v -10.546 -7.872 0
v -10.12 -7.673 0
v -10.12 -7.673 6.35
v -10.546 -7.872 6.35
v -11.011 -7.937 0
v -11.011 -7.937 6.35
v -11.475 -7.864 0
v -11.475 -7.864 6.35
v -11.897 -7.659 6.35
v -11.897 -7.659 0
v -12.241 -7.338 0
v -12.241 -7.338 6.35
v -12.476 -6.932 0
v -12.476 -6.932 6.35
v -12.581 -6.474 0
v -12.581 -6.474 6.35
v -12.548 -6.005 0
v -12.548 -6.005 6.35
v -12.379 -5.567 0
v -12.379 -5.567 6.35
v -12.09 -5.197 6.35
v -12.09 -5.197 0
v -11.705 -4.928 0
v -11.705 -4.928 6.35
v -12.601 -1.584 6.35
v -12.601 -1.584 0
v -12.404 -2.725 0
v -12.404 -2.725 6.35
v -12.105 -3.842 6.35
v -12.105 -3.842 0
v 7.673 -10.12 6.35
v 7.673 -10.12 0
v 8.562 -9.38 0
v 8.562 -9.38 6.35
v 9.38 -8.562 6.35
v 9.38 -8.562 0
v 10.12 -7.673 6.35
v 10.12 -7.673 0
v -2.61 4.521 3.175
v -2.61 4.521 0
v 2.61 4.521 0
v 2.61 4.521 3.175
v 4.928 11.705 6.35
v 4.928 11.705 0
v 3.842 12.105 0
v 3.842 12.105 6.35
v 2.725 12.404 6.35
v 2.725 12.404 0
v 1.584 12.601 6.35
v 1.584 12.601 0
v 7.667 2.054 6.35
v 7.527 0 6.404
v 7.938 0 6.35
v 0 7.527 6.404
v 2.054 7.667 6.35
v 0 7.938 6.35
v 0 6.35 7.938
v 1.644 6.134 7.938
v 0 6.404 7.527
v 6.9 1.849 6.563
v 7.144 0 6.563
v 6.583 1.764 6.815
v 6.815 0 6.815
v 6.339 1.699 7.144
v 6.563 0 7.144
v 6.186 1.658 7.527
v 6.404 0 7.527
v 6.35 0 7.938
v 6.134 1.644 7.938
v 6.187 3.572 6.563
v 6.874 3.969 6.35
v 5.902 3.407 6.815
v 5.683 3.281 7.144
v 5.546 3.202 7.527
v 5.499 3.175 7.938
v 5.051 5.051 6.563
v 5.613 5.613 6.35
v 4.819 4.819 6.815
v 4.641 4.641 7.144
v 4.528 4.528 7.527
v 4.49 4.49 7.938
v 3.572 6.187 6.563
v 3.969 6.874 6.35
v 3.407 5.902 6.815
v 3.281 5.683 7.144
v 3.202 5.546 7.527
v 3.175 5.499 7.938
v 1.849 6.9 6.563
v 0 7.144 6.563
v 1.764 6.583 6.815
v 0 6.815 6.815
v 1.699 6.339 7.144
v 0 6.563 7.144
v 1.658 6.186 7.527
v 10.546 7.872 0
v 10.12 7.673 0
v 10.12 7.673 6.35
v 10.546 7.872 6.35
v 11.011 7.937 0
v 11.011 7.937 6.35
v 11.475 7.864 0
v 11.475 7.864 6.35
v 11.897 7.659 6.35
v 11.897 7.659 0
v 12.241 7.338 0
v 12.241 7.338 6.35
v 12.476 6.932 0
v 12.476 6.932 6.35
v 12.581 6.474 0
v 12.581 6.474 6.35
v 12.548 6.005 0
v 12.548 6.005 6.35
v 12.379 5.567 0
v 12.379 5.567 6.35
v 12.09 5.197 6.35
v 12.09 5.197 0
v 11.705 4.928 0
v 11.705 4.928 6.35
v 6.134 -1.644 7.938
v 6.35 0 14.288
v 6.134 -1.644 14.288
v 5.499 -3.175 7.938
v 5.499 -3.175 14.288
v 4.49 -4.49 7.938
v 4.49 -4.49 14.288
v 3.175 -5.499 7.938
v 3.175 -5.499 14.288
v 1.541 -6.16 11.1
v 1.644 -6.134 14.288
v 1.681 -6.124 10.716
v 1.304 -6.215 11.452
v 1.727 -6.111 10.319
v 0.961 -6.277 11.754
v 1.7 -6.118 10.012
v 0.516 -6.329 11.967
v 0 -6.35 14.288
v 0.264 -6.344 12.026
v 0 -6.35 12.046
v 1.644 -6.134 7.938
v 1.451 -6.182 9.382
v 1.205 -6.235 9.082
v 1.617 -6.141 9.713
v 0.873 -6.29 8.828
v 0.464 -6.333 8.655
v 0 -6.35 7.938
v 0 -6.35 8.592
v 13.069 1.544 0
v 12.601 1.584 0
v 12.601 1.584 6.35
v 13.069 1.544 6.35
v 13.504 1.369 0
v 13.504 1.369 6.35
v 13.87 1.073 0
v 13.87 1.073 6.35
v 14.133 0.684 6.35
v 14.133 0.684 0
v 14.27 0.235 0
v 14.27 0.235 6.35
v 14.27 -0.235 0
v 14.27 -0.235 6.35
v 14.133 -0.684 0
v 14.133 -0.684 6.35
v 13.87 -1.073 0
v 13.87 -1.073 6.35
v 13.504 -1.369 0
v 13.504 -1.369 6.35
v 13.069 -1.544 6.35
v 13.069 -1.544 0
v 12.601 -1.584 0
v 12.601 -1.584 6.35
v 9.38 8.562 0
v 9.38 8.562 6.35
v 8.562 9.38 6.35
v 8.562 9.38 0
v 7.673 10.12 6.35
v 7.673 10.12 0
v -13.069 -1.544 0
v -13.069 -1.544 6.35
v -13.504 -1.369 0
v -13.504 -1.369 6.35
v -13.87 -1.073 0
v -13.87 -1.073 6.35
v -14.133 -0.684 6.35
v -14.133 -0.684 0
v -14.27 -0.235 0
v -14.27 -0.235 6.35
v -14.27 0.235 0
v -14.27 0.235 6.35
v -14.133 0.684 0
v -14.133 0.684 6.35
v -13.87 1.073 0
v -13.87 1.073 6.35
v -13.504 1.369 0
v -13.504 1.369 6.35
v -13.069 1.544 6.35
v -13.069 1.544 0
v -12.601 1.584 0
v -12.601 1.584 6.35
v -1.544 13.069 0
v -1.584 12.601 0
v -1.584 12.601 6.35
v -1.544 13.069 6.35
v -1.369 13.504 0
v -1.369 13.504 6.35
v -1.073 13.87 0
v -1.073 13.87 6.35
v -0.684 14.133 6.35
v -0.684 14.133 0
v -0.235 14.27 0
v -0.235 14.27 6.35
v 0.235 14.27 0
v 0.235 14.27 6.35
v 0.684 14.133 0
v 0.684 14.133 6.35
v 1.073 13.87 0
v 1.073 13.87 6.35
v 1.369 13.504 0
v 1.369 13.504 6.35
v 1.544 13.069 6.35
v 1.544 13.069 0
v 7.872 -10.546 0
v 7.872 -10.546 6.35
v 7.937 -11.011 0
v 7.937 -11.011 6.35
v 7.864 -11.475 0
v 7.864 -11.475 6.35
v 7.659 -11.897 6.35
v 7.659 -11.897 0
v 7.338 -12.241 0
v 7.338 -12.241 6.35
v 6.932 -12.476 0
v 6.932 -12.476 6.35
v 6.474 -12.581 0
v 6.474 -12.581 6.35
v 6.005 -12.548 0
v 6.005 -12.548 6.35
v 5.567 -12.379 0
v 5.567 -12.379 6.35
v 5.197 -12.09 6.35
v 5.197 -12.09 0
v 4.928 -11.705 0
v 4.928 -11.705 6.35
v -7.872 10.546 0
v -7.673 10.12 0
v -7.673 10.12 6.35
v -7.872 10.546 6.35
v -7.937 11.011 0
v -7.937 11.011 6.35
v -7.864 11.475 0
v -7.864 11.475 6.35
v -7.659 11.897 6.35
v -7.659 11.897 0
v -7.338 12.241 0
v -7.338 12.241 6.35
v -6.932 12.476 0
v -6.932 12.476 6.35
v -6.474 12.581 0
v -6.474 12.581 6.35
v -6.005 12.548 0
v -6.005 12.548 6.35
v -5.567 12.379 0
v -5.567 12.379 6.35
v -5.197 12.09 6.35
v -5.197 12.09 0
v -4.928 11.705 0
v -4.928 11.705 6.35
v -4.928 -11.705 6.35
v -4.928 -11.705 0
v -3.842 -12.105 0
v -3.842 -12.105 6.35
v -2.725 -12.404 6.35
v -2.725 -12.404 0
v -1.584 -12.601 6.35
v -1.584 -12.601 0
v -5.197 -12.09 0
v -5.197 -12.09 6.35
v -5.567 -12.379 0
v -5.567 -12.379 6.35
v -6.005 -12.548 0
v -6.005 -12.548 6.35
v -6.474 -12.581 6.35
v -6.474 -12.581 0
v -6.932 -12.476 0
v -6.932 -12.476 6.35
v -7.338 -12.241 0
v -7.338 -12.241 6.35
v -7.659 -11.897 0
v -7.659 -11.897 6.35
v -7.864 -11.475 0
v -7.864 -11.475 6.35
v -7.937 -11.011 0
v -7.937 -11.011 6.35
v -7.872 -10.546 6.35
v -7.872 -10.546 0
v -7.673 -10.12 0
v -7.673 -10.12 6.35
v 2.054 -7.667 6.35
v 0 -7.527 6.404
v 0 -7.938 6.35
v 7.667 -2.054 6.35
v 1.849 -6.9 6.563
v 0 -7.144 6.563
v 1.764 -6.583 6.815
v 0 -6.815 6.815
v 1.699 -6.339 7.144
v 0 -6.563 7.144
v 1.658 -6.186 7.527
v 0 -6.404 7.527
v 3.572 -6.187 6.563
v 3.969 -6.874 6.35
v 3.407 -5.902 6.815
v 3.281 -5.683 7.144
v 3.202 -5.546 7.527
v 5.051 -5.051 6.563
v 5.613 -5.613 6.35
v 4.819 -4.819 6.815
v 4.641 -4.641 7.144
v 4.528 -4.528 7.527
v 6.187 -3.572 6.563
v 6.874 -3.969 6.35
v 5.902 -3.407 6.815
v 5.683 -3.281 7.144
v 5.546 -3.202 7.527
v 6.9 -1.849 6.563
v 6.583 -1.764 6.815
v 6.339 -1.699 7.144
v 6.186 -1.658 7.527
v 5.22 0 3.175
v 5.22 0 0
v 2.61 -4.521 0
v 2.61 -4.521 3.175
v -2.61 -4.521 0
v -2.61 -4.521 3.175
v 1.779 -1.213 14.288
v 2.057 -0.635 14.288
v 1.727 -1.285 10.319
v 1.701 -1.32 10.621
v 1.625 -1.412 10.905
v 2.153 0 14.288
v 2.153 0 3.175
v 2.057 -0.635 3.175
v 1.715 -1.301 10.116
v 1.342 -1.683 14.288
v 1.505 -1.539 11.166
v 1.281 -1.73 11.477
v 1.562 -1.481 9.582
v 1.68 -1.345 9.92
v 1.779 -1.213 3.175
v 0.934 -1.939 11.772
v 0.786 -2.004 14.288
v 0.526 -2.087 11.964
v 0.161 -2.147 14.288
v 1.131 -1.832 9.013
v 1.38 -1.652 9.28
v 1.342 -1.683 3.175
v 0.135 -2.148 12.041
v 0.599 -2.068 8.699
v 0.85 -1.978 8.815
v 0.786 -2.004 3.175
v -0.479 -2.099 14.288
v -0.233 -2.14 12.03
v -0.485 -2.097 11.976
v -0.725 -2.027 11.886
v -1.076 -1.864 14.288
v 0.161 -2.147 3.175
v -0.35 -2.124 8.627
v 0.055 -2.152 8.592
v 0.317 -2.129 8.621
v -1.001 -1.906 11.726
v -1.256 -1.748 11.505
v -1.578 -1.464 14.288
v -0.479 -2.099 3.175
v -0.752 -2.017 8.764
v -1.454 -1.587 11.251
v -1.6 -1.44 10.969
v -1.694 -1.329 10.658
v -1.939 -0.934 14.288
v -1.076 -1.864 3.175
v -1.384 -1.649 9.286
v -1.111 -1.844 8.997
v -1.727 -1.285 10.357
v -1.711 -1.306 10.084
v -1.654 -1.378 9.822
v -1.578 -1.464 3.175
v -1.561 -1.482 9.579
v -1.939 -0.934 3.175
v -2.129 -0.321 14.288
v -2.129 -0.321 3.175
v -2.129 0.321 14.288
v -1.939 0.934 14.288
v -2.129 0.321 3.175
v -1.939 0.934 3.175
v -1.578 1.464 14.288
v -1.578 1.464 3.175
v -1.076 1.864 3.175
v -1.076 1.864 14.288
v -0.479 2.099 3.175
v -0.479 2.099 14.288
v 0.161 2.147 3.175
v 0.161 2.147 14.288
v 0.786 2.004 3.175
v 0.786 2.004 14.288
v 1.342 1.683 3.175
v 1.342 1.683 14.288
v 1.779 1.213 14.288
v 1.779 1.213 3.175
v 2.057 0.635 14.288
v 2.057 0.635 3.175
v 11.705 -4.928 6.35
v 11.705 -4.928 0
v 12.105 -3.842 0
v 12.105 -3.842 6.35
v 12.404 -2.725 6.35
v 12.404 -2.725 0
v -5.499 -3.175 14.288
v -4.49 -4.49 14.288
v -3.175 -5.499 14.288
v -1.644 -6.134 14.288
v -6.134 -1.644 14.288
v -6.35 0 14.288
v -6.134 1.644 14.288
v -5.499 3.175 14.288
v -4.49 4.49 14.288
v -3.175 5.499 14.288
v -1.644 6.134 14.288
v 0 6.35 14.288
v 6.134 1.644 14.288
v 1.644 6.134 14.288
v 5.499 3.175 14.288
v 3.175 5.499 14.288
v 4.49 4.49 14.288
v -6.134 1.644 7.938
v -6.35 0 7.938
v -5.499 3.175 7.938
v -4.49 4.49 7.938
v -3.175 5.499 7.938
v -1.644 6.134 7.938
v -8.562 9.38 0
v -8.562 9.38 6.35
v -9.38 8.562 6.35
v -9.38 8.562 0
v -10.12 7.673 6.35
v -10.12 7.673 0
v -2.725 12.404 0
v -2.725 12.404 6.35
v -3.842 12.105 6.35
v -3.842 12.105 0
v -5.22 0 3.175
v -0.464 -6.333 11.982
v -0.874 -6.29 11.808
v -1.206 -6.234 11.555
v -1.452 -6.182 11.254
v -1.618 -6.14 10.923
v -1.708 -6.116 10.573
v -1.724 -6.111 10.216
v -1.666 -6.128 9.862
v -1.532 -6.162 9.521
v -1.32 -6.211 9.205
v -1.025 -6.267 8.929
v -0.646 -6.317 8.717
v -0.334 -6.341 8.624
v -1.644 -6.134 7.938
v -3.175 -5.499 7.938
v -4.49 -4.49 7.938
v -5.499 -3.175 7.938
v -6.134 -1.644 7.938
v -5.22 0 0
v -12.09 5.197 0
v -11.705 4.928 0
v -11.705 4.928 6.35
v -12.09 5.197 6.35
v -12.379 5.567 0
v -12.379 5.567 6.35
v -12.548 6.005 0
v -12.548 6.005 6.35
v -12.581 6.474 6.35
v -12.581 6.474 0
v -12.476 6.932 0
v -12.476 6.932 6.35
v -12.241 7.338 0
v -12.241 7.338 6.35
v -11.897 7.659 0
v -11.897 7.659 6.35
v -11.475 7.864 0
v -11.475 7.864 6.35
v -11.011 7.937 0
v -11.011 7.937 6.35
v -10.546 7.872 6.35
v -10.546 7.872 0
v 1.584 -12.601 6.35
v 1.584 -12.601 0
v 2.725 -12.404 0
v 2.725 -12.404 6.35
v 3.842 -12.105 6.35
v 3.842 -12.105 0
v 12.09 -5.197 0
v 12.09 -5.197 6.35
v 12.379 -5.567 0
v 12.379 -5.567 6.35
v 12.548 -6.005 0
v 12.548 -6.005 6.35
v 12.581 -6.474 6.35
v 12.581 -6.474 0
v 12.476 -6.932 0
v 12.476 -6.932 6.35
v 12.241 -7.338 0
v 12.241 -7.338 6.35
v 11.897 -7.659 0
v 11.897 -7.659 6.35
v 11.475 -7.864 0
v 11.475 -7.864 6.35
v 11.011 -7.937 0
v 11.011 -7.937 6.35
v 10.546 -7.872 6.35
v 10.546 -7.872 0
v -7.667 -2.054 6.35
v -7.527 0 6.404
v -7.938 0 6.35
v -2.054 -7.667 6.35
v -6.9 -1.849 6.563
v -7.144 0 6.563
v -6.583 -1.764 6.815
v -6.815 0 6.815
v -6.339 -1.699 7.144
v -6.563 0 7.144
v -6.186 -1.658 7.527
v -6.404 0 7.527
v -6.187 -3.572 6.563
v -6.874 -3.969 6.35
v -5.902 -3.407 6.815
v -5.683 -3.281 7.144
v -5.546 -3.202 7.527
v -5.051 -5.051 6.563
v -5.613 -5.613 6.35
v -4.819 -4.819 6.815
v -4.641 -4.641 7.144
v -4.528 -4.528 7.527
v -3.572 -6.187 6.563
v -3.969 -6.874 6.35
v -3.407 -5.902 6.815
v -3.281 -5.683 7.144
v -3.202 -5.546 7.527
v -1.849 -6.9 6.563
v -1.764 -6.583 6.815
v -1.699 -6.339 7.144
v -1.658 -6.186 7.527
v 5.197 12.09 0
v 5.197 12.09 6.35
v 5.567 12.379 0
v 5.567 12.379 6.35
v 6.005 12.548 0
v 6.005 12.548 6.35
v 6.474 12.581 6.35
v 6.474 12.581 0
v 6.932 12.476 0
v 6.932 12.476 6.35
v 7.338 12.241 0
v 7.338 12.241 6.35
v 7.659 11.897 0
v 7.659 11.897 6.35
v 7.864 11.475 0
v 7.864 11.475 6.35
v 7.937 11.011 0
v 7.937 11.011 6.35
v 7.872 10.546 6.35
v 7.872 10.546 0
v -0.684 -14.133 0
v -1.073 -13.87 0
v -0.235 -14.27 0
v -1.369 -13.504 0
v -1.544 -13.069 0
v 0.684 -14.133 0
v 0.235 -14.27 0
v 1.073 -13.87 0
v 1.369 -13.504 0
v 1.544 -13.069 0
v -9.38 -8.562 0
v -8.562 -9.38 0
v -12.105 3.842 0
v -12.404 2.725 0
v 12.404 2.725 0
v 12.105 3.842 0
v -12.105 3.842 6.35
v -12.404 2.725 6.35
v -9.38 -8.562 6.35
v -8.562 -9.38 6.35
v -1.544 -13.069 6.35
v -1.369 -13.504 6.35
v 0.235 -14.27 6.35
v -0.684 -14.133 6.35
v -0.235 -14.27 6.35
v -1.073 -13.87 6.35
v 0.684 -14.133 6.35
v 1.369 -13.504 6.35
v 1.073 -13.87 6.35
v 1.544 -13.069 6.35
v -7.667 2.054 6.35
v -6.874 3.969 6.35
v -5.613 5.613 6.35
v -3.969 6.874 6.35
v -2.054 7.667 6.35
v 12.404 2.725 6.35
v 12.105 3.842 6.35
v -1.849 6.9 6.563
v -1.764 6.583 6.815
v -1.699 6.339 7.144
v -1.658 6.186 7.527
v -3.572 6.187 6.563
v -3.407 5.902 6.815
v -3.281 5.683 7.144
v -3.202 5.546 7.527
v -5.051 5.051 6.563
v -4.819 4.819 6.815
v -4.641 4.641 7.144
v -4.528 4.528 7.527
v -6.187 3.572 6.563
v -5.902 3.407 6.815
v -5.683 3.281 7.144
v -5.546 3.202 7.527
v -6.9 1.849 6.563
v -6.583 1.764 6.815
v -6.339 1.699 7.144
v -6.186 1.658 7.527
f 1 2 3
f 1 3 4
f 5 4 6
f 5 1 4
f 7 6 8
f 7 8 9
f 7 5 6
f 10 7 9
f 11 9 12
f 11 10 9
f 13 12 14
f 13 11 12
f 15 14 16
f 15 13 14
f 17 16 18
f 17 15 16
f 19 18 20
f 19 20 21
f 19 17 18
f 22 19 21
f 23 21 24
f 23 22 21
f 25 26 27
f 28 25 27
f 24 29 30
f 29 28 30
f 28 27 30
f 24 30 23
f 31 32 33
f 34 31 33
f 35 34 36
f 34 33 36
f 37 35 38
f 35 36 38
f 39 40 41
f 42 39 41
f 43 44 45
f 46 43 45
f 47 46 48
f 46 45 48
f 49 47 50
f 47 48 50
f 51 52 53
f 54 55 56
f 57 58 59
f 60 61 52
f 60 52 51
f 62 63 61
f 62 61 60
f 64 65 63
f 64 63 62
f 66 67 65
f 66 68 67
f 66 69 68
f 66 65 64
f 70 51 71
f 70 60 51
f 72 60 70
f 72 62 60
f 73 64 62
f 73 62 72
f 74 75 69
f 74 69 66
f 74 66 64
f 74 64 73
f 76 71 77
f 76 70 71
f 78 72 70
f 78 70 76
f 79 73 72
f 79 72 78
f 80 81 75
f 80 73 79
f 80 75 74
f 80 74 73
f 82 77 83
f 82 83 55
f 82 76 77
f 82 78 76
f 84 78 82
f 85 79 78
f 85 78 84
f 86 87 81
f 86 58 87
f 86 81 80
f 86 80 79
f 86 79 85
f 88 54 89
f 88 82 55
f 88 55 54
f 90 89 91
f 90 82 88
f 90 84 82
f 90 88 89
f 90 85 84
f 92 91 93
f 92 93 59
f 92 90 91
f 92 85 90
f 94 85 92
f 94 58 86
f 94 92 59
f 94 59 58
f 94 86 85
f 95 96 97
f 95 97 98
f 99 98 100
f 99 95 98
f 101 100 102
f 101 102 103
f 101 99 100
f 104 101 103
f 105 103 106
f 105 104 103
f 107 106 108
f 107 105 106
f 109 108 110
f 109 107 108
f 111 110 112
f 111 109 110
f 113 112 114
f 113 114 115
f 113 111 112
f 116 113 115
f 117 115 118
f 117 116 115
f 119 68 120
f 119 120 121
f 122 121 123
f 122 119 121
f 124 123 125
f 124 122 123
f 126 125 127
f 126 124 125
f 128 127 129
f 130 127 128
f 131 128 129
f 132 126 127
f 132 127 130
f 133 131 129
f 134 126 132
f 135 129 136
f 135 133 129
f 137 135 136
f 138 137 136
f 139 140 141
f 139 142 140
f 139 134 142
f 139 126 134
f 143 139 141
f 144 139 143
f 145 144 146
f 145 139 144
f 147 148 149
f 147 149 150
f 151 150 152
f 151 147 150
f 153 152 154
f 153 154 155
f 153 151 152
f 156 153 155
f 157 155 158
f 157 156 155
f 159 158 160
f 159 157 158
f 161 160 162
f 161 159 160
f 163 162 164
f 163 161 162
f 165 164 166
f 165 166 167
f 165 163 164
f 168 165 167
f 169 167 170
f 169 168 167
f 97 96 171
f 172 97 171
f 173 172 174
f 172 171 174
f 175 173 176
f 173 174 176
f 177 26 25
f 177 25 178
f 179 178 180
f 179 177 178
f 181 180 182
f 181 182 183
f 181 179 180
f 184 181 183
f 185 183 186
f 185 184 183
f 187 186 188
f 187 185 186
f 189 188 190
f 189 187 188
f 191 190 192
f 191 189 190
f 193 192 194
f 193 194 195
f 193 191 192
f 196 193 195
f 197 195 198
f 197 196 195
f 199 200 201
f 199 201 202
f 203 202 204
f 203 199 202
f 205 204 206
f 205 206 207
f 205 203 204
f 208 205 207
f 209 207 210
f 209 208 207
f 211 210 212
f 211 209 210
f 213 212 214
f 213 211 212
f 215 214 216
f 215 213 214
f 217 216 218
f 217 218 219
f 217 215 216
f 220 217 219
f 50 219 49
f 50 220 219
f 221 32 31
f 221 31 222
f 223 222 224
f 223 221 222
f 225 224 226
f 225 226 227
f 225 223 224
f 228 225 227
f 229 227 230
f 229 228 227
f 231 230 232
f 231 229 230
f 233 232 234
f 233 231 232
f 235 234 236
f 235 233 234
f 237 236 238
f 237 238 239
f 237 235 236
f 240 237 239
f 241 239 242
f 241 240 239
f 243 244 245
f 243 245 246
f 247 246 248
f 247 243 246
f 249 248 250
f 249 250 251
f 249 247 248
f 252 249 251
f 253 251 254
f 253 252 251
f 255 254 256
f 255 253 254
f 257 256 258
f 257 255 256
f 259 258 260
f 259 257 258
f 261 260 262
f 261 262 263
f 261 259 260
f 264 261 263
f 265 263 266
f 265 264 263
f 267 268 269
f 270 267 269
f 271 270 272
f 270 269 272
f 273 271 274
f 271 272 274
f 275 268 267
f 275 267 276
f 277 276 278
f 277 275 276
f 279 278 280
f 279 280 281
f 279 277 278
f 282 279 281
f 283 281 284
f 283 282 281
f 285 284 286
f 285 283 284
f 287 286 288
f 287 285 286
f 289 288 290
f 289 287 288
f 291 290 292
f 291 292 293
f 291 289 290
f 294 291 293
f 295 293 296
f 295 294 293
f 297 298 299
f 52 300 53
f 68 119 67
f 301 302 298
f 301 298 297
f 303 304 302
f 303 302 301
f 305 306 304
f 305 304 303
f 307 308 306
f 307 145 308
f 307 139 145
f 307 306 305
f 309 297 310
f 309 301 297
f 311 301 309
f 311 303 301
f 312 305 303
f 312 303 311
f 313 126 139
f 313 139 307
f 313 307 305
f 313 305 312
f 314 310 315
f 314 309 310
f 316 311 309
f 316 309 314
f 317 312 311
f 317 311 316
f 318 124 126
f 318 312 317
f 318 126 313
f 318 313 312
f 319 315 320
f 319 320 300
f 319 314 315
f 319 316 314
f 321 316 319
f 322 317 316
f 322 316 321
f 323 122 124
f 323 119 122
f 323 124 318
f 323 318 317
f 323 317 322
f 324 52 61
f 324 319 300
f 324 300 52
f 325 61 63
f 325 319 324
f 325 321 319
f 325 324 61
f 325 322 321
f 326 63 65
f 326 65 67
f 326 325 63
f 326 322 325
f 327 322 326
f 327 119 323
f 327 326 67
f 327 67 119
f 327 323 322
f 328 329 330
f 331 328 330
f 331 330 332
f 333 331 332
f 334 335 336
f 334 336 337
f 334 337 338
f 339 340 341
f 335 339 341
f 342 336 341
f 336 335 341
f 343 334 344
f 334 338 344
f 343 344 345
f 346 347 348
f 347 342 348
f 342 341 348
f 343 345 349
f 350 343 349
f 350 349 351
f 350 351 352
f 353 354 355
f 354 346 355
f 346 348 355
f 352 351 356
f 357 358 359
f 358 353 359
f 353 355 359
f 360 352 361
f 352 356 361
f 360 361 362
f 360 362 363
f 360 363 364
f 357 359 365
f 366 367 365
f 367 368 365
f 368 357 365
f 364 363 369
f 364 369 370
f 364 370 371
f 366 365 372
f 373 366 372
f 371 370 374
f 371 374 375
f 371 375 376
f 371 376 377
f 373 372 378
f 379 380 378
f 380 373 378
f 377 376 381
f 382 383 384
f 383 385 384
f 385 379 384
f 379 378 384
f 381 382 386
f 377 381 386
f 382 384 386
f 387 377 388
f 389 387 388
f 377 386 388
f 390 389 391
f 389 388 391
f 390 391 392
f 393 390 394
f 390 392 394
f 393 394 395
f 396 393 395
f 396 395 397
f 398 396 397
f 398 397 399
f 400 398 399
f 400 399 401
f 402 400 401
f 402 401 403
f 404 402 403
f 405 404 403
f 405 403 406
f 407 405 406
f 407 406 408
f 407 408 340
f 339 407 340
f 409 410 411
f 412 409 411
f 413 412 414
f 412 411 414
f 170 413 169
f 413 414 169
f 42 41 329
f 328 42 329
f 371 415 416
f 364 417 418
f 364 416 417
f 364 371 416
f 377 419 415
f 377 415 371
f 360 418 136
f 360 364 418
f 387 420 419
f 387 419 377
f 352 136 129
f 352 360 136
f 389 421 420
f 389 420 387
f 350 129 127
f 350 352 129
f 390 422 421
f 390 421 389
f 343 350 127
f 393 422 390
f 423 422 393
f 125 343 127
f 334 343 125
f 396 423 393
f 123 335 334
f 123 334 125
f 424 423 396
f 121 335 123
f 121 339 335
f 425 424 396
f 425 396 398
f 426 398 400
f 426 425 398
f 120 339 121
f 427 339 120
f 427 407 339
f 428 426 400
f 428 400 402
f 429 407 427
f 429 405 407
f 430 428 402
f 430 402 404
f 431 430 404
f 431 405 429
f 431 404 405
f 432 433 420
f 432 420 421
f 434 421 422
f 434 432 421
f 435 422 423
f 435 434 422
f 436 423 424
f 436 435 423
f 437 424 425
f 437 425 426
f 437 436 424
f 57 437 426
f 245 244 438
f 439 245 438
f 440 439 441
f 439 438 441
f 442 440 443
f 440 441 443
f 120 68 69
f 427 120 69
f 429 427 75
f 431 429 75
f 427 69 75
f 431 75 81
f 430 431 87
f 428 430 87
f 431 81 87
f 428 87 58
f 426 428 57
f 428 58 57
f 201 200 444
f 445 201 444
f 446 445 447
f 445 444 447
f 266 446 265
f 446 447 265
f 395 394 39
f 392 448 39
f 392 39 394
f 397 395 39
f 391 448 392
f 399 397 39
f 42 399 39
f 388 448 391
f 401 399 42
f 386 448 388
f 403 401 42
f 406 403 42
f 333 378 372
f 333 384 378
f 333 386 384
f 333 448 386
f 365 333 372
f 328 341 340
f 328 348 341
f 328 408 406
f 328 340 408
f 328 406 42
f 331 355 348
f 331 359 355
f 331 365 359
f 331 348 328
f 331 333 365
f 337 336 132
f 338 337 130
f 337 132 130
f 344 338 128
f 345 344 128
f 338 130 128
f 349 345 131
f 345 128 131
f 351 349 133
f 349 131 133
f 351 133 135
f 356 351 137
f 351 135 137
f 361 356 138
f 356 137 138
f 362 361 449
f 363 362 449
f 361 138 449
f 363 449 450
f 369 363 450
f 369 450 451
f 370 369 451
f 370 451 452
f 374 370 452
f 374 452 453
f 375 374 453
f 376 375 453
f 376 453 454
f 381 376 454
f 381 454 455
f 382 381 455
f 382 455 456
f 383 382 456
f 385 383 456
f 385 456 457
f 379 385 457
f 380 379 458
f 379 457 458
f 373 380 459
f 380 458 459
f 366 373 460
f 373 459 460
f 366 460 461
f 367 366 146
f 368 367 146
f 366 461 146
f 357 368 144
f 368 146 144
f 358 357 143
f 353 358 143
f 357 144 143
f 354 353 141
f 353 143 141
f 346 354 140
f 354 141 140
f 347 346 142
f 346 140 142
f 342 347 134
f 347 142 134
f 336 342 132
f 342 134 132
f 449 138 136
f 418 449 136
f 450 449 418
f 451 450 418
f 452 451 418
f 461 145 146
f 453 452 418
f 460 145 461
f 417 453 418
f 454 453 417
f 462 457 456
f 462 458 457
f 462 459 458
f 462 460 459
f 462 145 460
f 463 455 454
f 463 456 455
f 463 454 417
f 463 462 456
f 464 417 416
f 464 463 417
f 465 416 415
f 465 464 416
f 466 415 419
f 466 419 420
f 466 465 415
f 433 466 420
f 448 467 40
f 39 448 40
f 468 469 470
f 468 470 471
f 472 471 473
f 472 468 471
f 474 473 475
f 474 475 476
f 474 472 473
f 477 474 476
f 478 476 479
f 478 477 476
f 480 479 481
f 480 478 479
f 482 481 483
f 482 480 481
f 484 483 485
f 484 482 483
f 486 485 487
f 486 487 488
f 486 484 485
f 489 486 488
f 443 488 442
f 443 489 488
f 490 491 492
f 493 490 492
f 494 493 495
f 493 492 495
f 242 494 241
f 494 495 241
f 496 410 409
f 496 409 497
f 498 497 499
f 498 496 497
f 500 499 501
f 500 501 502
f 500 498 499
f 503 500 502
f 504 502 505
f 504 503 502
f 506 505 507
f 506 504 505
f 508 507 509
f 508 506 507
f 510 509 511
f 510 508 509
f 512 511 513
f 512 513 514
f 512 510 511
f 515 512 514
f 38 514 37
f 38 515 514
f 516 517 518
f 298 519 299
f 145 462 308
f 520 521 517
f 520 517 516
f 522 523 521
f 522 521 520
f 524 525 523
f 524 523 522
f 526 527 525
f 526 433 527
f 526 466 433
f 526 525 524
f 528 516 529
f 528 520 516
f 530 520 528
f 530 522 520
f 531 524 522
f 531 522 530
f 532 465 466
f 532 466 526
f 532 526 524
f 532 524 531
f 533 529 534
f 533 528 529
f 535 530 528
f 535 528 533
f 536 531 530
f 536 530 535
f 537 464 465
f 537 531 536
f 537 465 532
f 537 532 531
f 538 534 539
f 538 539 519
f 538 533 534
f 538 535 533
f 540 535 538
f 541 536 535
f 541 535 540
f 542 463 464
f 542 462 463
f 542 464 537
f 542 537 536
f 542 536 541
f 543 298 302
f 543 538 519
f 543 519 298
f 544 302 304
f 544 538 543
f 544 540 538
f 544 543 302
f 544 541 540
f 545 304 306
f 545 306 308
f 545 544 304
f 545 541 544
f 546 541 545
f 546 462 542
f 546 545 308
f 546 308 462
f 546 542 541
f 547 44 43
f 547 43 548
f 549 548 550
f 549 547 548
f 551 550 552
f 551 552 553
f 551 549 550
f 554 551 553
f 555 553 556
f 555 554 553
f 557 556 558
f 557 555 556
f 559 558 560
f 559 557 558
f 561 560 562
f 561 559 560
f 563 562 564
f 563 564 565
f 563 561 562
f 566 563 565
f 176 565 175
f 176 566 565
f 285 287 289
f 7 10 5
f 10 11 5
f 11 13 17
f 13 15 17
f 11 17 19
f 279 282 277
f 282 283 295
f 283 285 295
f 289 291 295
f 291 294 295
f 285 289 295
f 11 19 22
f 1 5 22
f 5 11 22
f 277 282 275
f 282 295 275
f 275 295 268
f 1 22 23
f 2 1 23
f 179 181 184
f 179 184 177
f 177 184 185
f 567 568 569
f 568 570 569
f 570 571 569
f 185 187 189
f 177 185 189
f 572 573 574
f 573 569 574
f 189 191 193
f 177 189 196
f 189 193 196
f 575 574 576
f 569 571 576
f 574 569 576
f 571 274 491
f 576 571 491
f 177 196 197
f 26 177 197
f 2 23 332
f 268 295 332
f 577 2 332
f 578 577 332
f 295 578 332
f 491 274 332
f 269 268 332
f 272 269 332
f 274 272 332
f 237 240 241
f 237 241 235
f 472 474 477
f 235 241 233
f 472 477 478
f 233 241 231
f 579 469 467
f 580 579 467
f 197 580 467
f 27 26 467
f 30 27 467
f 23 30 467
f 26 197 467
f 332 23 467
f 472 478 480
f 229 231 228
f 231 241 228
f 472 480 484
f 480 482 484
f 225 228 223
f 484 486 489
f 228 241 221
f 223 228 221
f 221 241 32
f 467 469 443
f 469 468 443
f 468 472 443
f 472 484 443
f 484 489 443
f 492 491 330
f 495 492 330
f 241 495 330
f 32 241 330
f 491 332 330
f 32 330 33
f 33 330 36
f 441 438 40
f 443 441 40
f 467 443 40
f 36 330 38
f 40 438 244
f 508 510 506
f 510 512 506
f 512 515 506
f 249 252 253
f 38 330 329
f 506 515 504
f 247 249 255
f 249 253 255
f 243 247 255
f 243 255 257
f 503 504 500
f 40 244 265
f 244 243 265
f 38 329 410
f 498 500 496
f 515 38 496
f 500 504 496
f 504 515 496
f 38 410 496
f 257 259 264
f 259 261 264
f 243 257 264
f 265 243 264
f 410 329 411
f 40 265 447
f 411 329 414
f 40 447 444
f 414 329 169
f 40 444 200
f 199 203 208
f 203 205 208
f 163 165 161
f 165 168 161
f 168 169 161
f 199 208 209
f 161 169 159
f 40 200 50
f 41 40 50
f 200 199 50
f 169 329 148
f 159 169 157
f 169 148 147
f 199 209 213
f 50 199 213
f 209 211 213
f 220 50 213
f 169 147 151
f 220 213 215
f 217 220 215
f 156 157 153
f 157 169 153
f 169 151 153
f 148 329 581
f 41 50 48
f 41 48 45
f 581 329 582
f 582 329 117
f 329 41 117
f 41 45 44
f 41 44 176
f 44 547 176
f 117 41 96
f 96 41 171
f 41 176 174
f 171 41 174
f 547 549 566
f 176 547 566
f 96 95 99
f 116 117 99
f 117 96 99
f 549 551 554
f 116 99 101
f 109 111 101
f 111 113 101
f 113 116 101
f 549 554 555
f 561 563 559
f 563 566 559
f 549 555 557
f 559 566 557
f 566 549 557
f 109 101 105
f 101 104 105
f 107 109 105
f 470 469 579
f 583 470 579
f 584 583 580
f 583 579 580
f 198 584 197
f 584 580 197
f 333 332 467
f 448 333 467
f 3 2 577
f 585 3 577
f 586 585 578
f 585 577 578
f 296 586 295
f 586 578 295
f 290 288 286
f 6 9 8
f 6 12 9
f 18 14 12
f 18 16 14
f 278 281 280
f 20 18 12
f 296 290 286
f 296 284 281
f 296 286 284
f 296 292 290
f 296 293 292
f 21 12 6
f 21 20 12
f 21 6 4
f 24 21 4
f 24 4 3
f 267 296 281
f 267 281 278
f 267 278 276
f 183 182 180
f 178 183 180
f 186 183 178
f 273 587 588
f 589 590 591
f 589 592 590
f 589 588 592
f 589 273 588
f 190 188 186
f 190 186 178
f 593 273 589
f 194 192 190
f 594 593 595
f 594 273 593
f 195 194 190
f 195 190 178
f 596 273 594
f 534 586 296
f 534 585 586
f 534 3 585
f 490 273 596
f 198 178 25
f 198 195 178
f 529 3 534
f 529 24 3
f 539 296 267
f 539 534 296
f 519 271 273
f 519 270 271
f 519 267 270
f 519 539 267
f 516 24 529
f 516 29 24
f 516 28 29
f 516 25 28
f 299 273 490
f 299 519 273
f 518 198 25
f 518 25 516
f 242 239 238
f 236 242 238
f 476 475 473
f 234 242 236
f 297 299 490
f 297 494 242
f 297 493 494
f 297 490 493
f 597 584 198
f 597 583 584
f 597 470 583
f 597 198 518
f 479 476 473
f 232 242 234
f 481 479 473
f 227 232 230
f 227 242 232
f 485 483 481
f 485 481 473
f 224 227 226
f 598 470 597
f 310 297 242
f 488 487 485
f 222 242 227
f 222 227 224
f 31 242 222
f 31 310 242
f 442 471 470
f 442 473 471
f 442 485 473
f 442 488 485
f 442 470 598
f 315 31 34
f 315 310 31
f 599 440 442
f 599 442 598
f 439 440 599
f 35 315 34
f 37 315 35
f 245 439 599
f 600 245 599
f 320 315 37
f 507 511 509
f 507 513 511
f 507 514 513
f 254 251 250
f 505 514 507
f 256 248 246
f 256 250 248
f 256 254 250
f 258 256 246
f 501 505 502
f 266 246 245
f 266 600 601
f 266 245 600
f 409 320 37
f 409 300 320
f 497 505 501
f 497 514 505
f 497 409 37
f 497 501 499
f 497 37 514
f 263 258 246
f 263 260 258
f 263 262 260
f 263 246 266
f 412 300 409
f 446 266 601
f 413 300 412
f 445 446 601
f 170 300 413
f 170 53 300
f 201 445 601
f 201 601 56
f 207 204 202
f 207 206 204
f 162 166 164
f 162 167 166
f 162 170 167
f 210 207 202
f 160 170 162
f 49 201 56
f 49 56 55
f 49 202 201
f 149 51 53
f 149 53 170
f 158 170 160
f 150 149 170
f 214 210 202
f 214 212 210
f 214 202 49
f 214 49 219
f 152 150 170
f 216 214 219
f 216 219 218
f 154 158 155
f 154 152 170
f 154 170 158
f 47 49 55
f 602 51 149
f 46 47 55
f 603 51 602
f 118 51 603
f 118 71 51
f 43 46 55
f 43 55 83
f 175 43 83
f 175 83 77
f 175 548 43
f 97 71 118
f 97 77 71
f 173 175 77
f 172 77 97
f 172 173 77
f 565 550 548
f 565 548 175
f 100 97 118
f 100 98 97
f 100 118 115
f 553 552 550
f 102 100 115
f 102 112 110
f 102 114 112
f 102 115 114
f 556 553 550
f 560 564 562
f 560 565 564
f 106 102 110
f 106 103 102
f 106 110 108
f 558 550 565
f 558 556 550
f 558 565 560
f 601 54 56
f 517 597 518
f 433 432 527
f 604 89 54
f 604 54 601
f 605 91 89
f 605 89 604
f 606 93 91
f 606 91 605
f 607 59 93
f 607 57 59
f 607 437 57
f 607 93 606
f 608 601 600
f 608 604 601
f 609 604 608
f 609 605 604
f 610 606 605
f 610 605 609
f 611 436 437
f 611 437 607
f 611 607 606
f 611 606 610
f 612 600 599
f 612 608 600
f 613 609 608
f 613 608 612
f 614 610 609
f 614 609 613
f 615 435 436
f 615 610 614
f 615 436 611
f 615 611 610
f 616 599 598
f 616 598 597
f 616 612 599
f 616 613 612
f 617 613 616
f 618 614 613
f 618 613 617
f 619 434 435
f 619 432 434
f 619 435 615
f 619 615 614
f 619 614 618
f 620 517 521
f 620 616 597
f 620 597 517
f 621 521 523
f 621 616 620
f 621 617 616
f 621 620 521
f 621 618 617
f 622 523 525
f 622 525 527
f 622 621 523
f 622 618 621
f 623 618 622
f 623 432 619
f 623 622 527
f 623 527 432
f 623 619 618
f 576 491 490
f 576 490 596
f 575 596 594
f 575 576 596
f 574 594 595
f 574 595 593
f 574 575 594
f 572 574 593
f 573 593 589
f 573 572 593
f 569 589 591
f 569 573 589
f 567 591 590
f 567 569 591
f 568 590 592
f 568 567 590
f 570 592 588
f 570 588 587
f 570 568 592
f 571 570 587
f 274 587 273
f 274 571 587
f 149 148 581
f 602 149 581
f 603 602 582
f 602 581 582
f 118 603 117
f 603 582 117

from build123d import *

# Parameters (mm, degrees)
F0_R         = 12.7
F1_DEPTH     = 6.35
F3_DEPTH     = 3.175
F4_W         = 12.7
F4_H         = 12.7
F5_DEPTH     = 7.9375
F7_DEPTH     = 6.35
F8_COUNT     = 12
F8_ANGLE     = 330
F9_R         = 2.15265
F10_DEPTH    = 11.1125
F11_R        = 1.7272
F12_REACH    = 25.5237593299
F13_T1_DEPTH = 7.9375
F14_R        = 1.5875


# Not quite as in the source:
# - a fillet or chamfer that OpenCascade refuses, or shapes differently, is made with other operations: its cross-section is extruded or revolved along the edge and cut away or added


with BuildPart() as f1:
    # F0 (on Top) → F1 (new body)
    with BuildSketch(Plane.XY):
        Circle(F0_R)
    extrude(amount=F1_DEPTH)

    # F2 (on face) → F3 (cut)
    with BuildSketch(Plane(origin=(0, 0, 0), x_dir=(1, 0, 0), z_dir=(0, 0, -1))):
        Polygon((2.6100007461, 4.5206539), (-2.6100007461, 4.5206539), (-5.2200014922, 0), (-2.6100007461, -4.5206539), (2.6100007461, -4.5206539), (5.2200014922, 0), align=None)
    extrude(amount=-F3_DEPTH, mode=Mode.SUBTRACT)

    # F4 (on face) → F5 (join)
    with BuildSketch(Plane.XY.offset(6.35)):
        Rectangle(F4_W, F4_H)
    extrude(amount=F5_DEPTH)

    # F6 (on face) → F7 (join, through all)
    with BuildSketch(Plane(origin=(0, 0, 0), x_dir=(1, 0, 0), z_dir=(0, 0, -1))):
        with BuildLine():
            ThreePointArc((-1.5843963802, 12.60078125), (0, 12.7), (1.5843963802, 12.60078125))
            ThreePointArc((1.5843963802, 12.60078125), (0, 14.2875), (-1.5843963802, 12.60078125))
        make_face()
    f7 = extrude(amount=-F7_DEPTH)

    # F8: F7 ×12 about axis
    f8_axis = Axis((0, 0, 0), (0, 0, -1))
    for i in range(1, F8_COUNT):
        add(f7.rotate(f8_axis, i * F8_ANGLE / (F8_COUNT - 1)))

    # F9 (on face) → F10 (cut, through all)
    with BuildSketch(Plane(origin=(0, 0, 3.175), x_dir=(1, 0, 0), z_dir=(0, 0, -1))):
        Circle(F9_R)
    extrude(amount=-F10_DEPTH, mode=Mode.SUBTRACT)

    f12_end = f1.faces().sort_by_distance((-2.15265, 0, 8.73125))[0]
    # F11 (on face) → F12 (cut, up to a face of the model that its end follows)
    with BuildSketch(Plane.XZ.offset(6.35)):
        with Locations((0, 10.31875)):
            Circle(F11_R)
    f12_long = extrude(amount=-F12_REACH, mode=Mode.PRIVATE)
    add(split(f12_long, bisect_by=f12_end, keep=Keep.ALL, mode=Mode.PRIVATE).solids().sort_by_distance((0, -6.35, 10.31875))[0], mode=Mode.SUBTRACT)

    # F13: fillet of radius 6.35 on 4 edges, made by hand

    # F13_s2 → F13_t1 (cut)
    with BuildSketch(Plane.XY.offset(6.35)):
        with BuildLine():
            ThreePointArc((0, -6.35), (-4.4901280605, -4.4901280605), (-6.35, 0))
            Line((-6.35, 0), (-6.477, 0))
            Line((-6.477, 0), (-6.477, -6.477))
            Line((-6.477, -6.477), (0, -6.477))
            Line((0, -6.477), (0, -6.35))
        make_face()
        with BuildLine():
            ThreePointArc((6.35, 0), (4.4901280605, -4.4901280605), (0, -6.35))
            Line((0, -6.35), (0, -6.477))
            Line((0, -6.477), (6.477, -6.477))
            Line((6.477, -6.477), (6.477, 0))
            Line((6.477, 0), (6.35, 0))
        make_face()
        with BuildLine():
            ThreePointArc((6.35, 0), (4.4901280605, 4.4901280605), (0, 6.35))
            Line((0, 6.35), (0, 6.477))
            Line((0, 6.477), (6.477, 6.477))
            Line((6.477, 6.477), (6.477, 0))
            Line((6.477, 0), (6.35, 0))
        make_face()
        with BuildLine():
            ThreePointArc((-6.35, 0), (-4.4901280605, 4.4901280605), (0, 6.35))
            Line((0, 6.35), (0, 6.477))
            Line((0, 6.477), (-6.477, 6.477))
            Line((-6.477, 6.477), (-6.477, 0))
            Line((-6.477, 0), (-6.35, 0))
        make_face()
    extrude(amount=F13_T1_DEPTH, mode=Mode.SUBTRACT)

    # F14
    f14_edges = [f1.edges().sort_by_distance(p)[0] for p in [
        (4.490128, 4.490128, 6.35),
    ]]
    fillet(f14_edges, radius=F14_R)


solid = f1.part
